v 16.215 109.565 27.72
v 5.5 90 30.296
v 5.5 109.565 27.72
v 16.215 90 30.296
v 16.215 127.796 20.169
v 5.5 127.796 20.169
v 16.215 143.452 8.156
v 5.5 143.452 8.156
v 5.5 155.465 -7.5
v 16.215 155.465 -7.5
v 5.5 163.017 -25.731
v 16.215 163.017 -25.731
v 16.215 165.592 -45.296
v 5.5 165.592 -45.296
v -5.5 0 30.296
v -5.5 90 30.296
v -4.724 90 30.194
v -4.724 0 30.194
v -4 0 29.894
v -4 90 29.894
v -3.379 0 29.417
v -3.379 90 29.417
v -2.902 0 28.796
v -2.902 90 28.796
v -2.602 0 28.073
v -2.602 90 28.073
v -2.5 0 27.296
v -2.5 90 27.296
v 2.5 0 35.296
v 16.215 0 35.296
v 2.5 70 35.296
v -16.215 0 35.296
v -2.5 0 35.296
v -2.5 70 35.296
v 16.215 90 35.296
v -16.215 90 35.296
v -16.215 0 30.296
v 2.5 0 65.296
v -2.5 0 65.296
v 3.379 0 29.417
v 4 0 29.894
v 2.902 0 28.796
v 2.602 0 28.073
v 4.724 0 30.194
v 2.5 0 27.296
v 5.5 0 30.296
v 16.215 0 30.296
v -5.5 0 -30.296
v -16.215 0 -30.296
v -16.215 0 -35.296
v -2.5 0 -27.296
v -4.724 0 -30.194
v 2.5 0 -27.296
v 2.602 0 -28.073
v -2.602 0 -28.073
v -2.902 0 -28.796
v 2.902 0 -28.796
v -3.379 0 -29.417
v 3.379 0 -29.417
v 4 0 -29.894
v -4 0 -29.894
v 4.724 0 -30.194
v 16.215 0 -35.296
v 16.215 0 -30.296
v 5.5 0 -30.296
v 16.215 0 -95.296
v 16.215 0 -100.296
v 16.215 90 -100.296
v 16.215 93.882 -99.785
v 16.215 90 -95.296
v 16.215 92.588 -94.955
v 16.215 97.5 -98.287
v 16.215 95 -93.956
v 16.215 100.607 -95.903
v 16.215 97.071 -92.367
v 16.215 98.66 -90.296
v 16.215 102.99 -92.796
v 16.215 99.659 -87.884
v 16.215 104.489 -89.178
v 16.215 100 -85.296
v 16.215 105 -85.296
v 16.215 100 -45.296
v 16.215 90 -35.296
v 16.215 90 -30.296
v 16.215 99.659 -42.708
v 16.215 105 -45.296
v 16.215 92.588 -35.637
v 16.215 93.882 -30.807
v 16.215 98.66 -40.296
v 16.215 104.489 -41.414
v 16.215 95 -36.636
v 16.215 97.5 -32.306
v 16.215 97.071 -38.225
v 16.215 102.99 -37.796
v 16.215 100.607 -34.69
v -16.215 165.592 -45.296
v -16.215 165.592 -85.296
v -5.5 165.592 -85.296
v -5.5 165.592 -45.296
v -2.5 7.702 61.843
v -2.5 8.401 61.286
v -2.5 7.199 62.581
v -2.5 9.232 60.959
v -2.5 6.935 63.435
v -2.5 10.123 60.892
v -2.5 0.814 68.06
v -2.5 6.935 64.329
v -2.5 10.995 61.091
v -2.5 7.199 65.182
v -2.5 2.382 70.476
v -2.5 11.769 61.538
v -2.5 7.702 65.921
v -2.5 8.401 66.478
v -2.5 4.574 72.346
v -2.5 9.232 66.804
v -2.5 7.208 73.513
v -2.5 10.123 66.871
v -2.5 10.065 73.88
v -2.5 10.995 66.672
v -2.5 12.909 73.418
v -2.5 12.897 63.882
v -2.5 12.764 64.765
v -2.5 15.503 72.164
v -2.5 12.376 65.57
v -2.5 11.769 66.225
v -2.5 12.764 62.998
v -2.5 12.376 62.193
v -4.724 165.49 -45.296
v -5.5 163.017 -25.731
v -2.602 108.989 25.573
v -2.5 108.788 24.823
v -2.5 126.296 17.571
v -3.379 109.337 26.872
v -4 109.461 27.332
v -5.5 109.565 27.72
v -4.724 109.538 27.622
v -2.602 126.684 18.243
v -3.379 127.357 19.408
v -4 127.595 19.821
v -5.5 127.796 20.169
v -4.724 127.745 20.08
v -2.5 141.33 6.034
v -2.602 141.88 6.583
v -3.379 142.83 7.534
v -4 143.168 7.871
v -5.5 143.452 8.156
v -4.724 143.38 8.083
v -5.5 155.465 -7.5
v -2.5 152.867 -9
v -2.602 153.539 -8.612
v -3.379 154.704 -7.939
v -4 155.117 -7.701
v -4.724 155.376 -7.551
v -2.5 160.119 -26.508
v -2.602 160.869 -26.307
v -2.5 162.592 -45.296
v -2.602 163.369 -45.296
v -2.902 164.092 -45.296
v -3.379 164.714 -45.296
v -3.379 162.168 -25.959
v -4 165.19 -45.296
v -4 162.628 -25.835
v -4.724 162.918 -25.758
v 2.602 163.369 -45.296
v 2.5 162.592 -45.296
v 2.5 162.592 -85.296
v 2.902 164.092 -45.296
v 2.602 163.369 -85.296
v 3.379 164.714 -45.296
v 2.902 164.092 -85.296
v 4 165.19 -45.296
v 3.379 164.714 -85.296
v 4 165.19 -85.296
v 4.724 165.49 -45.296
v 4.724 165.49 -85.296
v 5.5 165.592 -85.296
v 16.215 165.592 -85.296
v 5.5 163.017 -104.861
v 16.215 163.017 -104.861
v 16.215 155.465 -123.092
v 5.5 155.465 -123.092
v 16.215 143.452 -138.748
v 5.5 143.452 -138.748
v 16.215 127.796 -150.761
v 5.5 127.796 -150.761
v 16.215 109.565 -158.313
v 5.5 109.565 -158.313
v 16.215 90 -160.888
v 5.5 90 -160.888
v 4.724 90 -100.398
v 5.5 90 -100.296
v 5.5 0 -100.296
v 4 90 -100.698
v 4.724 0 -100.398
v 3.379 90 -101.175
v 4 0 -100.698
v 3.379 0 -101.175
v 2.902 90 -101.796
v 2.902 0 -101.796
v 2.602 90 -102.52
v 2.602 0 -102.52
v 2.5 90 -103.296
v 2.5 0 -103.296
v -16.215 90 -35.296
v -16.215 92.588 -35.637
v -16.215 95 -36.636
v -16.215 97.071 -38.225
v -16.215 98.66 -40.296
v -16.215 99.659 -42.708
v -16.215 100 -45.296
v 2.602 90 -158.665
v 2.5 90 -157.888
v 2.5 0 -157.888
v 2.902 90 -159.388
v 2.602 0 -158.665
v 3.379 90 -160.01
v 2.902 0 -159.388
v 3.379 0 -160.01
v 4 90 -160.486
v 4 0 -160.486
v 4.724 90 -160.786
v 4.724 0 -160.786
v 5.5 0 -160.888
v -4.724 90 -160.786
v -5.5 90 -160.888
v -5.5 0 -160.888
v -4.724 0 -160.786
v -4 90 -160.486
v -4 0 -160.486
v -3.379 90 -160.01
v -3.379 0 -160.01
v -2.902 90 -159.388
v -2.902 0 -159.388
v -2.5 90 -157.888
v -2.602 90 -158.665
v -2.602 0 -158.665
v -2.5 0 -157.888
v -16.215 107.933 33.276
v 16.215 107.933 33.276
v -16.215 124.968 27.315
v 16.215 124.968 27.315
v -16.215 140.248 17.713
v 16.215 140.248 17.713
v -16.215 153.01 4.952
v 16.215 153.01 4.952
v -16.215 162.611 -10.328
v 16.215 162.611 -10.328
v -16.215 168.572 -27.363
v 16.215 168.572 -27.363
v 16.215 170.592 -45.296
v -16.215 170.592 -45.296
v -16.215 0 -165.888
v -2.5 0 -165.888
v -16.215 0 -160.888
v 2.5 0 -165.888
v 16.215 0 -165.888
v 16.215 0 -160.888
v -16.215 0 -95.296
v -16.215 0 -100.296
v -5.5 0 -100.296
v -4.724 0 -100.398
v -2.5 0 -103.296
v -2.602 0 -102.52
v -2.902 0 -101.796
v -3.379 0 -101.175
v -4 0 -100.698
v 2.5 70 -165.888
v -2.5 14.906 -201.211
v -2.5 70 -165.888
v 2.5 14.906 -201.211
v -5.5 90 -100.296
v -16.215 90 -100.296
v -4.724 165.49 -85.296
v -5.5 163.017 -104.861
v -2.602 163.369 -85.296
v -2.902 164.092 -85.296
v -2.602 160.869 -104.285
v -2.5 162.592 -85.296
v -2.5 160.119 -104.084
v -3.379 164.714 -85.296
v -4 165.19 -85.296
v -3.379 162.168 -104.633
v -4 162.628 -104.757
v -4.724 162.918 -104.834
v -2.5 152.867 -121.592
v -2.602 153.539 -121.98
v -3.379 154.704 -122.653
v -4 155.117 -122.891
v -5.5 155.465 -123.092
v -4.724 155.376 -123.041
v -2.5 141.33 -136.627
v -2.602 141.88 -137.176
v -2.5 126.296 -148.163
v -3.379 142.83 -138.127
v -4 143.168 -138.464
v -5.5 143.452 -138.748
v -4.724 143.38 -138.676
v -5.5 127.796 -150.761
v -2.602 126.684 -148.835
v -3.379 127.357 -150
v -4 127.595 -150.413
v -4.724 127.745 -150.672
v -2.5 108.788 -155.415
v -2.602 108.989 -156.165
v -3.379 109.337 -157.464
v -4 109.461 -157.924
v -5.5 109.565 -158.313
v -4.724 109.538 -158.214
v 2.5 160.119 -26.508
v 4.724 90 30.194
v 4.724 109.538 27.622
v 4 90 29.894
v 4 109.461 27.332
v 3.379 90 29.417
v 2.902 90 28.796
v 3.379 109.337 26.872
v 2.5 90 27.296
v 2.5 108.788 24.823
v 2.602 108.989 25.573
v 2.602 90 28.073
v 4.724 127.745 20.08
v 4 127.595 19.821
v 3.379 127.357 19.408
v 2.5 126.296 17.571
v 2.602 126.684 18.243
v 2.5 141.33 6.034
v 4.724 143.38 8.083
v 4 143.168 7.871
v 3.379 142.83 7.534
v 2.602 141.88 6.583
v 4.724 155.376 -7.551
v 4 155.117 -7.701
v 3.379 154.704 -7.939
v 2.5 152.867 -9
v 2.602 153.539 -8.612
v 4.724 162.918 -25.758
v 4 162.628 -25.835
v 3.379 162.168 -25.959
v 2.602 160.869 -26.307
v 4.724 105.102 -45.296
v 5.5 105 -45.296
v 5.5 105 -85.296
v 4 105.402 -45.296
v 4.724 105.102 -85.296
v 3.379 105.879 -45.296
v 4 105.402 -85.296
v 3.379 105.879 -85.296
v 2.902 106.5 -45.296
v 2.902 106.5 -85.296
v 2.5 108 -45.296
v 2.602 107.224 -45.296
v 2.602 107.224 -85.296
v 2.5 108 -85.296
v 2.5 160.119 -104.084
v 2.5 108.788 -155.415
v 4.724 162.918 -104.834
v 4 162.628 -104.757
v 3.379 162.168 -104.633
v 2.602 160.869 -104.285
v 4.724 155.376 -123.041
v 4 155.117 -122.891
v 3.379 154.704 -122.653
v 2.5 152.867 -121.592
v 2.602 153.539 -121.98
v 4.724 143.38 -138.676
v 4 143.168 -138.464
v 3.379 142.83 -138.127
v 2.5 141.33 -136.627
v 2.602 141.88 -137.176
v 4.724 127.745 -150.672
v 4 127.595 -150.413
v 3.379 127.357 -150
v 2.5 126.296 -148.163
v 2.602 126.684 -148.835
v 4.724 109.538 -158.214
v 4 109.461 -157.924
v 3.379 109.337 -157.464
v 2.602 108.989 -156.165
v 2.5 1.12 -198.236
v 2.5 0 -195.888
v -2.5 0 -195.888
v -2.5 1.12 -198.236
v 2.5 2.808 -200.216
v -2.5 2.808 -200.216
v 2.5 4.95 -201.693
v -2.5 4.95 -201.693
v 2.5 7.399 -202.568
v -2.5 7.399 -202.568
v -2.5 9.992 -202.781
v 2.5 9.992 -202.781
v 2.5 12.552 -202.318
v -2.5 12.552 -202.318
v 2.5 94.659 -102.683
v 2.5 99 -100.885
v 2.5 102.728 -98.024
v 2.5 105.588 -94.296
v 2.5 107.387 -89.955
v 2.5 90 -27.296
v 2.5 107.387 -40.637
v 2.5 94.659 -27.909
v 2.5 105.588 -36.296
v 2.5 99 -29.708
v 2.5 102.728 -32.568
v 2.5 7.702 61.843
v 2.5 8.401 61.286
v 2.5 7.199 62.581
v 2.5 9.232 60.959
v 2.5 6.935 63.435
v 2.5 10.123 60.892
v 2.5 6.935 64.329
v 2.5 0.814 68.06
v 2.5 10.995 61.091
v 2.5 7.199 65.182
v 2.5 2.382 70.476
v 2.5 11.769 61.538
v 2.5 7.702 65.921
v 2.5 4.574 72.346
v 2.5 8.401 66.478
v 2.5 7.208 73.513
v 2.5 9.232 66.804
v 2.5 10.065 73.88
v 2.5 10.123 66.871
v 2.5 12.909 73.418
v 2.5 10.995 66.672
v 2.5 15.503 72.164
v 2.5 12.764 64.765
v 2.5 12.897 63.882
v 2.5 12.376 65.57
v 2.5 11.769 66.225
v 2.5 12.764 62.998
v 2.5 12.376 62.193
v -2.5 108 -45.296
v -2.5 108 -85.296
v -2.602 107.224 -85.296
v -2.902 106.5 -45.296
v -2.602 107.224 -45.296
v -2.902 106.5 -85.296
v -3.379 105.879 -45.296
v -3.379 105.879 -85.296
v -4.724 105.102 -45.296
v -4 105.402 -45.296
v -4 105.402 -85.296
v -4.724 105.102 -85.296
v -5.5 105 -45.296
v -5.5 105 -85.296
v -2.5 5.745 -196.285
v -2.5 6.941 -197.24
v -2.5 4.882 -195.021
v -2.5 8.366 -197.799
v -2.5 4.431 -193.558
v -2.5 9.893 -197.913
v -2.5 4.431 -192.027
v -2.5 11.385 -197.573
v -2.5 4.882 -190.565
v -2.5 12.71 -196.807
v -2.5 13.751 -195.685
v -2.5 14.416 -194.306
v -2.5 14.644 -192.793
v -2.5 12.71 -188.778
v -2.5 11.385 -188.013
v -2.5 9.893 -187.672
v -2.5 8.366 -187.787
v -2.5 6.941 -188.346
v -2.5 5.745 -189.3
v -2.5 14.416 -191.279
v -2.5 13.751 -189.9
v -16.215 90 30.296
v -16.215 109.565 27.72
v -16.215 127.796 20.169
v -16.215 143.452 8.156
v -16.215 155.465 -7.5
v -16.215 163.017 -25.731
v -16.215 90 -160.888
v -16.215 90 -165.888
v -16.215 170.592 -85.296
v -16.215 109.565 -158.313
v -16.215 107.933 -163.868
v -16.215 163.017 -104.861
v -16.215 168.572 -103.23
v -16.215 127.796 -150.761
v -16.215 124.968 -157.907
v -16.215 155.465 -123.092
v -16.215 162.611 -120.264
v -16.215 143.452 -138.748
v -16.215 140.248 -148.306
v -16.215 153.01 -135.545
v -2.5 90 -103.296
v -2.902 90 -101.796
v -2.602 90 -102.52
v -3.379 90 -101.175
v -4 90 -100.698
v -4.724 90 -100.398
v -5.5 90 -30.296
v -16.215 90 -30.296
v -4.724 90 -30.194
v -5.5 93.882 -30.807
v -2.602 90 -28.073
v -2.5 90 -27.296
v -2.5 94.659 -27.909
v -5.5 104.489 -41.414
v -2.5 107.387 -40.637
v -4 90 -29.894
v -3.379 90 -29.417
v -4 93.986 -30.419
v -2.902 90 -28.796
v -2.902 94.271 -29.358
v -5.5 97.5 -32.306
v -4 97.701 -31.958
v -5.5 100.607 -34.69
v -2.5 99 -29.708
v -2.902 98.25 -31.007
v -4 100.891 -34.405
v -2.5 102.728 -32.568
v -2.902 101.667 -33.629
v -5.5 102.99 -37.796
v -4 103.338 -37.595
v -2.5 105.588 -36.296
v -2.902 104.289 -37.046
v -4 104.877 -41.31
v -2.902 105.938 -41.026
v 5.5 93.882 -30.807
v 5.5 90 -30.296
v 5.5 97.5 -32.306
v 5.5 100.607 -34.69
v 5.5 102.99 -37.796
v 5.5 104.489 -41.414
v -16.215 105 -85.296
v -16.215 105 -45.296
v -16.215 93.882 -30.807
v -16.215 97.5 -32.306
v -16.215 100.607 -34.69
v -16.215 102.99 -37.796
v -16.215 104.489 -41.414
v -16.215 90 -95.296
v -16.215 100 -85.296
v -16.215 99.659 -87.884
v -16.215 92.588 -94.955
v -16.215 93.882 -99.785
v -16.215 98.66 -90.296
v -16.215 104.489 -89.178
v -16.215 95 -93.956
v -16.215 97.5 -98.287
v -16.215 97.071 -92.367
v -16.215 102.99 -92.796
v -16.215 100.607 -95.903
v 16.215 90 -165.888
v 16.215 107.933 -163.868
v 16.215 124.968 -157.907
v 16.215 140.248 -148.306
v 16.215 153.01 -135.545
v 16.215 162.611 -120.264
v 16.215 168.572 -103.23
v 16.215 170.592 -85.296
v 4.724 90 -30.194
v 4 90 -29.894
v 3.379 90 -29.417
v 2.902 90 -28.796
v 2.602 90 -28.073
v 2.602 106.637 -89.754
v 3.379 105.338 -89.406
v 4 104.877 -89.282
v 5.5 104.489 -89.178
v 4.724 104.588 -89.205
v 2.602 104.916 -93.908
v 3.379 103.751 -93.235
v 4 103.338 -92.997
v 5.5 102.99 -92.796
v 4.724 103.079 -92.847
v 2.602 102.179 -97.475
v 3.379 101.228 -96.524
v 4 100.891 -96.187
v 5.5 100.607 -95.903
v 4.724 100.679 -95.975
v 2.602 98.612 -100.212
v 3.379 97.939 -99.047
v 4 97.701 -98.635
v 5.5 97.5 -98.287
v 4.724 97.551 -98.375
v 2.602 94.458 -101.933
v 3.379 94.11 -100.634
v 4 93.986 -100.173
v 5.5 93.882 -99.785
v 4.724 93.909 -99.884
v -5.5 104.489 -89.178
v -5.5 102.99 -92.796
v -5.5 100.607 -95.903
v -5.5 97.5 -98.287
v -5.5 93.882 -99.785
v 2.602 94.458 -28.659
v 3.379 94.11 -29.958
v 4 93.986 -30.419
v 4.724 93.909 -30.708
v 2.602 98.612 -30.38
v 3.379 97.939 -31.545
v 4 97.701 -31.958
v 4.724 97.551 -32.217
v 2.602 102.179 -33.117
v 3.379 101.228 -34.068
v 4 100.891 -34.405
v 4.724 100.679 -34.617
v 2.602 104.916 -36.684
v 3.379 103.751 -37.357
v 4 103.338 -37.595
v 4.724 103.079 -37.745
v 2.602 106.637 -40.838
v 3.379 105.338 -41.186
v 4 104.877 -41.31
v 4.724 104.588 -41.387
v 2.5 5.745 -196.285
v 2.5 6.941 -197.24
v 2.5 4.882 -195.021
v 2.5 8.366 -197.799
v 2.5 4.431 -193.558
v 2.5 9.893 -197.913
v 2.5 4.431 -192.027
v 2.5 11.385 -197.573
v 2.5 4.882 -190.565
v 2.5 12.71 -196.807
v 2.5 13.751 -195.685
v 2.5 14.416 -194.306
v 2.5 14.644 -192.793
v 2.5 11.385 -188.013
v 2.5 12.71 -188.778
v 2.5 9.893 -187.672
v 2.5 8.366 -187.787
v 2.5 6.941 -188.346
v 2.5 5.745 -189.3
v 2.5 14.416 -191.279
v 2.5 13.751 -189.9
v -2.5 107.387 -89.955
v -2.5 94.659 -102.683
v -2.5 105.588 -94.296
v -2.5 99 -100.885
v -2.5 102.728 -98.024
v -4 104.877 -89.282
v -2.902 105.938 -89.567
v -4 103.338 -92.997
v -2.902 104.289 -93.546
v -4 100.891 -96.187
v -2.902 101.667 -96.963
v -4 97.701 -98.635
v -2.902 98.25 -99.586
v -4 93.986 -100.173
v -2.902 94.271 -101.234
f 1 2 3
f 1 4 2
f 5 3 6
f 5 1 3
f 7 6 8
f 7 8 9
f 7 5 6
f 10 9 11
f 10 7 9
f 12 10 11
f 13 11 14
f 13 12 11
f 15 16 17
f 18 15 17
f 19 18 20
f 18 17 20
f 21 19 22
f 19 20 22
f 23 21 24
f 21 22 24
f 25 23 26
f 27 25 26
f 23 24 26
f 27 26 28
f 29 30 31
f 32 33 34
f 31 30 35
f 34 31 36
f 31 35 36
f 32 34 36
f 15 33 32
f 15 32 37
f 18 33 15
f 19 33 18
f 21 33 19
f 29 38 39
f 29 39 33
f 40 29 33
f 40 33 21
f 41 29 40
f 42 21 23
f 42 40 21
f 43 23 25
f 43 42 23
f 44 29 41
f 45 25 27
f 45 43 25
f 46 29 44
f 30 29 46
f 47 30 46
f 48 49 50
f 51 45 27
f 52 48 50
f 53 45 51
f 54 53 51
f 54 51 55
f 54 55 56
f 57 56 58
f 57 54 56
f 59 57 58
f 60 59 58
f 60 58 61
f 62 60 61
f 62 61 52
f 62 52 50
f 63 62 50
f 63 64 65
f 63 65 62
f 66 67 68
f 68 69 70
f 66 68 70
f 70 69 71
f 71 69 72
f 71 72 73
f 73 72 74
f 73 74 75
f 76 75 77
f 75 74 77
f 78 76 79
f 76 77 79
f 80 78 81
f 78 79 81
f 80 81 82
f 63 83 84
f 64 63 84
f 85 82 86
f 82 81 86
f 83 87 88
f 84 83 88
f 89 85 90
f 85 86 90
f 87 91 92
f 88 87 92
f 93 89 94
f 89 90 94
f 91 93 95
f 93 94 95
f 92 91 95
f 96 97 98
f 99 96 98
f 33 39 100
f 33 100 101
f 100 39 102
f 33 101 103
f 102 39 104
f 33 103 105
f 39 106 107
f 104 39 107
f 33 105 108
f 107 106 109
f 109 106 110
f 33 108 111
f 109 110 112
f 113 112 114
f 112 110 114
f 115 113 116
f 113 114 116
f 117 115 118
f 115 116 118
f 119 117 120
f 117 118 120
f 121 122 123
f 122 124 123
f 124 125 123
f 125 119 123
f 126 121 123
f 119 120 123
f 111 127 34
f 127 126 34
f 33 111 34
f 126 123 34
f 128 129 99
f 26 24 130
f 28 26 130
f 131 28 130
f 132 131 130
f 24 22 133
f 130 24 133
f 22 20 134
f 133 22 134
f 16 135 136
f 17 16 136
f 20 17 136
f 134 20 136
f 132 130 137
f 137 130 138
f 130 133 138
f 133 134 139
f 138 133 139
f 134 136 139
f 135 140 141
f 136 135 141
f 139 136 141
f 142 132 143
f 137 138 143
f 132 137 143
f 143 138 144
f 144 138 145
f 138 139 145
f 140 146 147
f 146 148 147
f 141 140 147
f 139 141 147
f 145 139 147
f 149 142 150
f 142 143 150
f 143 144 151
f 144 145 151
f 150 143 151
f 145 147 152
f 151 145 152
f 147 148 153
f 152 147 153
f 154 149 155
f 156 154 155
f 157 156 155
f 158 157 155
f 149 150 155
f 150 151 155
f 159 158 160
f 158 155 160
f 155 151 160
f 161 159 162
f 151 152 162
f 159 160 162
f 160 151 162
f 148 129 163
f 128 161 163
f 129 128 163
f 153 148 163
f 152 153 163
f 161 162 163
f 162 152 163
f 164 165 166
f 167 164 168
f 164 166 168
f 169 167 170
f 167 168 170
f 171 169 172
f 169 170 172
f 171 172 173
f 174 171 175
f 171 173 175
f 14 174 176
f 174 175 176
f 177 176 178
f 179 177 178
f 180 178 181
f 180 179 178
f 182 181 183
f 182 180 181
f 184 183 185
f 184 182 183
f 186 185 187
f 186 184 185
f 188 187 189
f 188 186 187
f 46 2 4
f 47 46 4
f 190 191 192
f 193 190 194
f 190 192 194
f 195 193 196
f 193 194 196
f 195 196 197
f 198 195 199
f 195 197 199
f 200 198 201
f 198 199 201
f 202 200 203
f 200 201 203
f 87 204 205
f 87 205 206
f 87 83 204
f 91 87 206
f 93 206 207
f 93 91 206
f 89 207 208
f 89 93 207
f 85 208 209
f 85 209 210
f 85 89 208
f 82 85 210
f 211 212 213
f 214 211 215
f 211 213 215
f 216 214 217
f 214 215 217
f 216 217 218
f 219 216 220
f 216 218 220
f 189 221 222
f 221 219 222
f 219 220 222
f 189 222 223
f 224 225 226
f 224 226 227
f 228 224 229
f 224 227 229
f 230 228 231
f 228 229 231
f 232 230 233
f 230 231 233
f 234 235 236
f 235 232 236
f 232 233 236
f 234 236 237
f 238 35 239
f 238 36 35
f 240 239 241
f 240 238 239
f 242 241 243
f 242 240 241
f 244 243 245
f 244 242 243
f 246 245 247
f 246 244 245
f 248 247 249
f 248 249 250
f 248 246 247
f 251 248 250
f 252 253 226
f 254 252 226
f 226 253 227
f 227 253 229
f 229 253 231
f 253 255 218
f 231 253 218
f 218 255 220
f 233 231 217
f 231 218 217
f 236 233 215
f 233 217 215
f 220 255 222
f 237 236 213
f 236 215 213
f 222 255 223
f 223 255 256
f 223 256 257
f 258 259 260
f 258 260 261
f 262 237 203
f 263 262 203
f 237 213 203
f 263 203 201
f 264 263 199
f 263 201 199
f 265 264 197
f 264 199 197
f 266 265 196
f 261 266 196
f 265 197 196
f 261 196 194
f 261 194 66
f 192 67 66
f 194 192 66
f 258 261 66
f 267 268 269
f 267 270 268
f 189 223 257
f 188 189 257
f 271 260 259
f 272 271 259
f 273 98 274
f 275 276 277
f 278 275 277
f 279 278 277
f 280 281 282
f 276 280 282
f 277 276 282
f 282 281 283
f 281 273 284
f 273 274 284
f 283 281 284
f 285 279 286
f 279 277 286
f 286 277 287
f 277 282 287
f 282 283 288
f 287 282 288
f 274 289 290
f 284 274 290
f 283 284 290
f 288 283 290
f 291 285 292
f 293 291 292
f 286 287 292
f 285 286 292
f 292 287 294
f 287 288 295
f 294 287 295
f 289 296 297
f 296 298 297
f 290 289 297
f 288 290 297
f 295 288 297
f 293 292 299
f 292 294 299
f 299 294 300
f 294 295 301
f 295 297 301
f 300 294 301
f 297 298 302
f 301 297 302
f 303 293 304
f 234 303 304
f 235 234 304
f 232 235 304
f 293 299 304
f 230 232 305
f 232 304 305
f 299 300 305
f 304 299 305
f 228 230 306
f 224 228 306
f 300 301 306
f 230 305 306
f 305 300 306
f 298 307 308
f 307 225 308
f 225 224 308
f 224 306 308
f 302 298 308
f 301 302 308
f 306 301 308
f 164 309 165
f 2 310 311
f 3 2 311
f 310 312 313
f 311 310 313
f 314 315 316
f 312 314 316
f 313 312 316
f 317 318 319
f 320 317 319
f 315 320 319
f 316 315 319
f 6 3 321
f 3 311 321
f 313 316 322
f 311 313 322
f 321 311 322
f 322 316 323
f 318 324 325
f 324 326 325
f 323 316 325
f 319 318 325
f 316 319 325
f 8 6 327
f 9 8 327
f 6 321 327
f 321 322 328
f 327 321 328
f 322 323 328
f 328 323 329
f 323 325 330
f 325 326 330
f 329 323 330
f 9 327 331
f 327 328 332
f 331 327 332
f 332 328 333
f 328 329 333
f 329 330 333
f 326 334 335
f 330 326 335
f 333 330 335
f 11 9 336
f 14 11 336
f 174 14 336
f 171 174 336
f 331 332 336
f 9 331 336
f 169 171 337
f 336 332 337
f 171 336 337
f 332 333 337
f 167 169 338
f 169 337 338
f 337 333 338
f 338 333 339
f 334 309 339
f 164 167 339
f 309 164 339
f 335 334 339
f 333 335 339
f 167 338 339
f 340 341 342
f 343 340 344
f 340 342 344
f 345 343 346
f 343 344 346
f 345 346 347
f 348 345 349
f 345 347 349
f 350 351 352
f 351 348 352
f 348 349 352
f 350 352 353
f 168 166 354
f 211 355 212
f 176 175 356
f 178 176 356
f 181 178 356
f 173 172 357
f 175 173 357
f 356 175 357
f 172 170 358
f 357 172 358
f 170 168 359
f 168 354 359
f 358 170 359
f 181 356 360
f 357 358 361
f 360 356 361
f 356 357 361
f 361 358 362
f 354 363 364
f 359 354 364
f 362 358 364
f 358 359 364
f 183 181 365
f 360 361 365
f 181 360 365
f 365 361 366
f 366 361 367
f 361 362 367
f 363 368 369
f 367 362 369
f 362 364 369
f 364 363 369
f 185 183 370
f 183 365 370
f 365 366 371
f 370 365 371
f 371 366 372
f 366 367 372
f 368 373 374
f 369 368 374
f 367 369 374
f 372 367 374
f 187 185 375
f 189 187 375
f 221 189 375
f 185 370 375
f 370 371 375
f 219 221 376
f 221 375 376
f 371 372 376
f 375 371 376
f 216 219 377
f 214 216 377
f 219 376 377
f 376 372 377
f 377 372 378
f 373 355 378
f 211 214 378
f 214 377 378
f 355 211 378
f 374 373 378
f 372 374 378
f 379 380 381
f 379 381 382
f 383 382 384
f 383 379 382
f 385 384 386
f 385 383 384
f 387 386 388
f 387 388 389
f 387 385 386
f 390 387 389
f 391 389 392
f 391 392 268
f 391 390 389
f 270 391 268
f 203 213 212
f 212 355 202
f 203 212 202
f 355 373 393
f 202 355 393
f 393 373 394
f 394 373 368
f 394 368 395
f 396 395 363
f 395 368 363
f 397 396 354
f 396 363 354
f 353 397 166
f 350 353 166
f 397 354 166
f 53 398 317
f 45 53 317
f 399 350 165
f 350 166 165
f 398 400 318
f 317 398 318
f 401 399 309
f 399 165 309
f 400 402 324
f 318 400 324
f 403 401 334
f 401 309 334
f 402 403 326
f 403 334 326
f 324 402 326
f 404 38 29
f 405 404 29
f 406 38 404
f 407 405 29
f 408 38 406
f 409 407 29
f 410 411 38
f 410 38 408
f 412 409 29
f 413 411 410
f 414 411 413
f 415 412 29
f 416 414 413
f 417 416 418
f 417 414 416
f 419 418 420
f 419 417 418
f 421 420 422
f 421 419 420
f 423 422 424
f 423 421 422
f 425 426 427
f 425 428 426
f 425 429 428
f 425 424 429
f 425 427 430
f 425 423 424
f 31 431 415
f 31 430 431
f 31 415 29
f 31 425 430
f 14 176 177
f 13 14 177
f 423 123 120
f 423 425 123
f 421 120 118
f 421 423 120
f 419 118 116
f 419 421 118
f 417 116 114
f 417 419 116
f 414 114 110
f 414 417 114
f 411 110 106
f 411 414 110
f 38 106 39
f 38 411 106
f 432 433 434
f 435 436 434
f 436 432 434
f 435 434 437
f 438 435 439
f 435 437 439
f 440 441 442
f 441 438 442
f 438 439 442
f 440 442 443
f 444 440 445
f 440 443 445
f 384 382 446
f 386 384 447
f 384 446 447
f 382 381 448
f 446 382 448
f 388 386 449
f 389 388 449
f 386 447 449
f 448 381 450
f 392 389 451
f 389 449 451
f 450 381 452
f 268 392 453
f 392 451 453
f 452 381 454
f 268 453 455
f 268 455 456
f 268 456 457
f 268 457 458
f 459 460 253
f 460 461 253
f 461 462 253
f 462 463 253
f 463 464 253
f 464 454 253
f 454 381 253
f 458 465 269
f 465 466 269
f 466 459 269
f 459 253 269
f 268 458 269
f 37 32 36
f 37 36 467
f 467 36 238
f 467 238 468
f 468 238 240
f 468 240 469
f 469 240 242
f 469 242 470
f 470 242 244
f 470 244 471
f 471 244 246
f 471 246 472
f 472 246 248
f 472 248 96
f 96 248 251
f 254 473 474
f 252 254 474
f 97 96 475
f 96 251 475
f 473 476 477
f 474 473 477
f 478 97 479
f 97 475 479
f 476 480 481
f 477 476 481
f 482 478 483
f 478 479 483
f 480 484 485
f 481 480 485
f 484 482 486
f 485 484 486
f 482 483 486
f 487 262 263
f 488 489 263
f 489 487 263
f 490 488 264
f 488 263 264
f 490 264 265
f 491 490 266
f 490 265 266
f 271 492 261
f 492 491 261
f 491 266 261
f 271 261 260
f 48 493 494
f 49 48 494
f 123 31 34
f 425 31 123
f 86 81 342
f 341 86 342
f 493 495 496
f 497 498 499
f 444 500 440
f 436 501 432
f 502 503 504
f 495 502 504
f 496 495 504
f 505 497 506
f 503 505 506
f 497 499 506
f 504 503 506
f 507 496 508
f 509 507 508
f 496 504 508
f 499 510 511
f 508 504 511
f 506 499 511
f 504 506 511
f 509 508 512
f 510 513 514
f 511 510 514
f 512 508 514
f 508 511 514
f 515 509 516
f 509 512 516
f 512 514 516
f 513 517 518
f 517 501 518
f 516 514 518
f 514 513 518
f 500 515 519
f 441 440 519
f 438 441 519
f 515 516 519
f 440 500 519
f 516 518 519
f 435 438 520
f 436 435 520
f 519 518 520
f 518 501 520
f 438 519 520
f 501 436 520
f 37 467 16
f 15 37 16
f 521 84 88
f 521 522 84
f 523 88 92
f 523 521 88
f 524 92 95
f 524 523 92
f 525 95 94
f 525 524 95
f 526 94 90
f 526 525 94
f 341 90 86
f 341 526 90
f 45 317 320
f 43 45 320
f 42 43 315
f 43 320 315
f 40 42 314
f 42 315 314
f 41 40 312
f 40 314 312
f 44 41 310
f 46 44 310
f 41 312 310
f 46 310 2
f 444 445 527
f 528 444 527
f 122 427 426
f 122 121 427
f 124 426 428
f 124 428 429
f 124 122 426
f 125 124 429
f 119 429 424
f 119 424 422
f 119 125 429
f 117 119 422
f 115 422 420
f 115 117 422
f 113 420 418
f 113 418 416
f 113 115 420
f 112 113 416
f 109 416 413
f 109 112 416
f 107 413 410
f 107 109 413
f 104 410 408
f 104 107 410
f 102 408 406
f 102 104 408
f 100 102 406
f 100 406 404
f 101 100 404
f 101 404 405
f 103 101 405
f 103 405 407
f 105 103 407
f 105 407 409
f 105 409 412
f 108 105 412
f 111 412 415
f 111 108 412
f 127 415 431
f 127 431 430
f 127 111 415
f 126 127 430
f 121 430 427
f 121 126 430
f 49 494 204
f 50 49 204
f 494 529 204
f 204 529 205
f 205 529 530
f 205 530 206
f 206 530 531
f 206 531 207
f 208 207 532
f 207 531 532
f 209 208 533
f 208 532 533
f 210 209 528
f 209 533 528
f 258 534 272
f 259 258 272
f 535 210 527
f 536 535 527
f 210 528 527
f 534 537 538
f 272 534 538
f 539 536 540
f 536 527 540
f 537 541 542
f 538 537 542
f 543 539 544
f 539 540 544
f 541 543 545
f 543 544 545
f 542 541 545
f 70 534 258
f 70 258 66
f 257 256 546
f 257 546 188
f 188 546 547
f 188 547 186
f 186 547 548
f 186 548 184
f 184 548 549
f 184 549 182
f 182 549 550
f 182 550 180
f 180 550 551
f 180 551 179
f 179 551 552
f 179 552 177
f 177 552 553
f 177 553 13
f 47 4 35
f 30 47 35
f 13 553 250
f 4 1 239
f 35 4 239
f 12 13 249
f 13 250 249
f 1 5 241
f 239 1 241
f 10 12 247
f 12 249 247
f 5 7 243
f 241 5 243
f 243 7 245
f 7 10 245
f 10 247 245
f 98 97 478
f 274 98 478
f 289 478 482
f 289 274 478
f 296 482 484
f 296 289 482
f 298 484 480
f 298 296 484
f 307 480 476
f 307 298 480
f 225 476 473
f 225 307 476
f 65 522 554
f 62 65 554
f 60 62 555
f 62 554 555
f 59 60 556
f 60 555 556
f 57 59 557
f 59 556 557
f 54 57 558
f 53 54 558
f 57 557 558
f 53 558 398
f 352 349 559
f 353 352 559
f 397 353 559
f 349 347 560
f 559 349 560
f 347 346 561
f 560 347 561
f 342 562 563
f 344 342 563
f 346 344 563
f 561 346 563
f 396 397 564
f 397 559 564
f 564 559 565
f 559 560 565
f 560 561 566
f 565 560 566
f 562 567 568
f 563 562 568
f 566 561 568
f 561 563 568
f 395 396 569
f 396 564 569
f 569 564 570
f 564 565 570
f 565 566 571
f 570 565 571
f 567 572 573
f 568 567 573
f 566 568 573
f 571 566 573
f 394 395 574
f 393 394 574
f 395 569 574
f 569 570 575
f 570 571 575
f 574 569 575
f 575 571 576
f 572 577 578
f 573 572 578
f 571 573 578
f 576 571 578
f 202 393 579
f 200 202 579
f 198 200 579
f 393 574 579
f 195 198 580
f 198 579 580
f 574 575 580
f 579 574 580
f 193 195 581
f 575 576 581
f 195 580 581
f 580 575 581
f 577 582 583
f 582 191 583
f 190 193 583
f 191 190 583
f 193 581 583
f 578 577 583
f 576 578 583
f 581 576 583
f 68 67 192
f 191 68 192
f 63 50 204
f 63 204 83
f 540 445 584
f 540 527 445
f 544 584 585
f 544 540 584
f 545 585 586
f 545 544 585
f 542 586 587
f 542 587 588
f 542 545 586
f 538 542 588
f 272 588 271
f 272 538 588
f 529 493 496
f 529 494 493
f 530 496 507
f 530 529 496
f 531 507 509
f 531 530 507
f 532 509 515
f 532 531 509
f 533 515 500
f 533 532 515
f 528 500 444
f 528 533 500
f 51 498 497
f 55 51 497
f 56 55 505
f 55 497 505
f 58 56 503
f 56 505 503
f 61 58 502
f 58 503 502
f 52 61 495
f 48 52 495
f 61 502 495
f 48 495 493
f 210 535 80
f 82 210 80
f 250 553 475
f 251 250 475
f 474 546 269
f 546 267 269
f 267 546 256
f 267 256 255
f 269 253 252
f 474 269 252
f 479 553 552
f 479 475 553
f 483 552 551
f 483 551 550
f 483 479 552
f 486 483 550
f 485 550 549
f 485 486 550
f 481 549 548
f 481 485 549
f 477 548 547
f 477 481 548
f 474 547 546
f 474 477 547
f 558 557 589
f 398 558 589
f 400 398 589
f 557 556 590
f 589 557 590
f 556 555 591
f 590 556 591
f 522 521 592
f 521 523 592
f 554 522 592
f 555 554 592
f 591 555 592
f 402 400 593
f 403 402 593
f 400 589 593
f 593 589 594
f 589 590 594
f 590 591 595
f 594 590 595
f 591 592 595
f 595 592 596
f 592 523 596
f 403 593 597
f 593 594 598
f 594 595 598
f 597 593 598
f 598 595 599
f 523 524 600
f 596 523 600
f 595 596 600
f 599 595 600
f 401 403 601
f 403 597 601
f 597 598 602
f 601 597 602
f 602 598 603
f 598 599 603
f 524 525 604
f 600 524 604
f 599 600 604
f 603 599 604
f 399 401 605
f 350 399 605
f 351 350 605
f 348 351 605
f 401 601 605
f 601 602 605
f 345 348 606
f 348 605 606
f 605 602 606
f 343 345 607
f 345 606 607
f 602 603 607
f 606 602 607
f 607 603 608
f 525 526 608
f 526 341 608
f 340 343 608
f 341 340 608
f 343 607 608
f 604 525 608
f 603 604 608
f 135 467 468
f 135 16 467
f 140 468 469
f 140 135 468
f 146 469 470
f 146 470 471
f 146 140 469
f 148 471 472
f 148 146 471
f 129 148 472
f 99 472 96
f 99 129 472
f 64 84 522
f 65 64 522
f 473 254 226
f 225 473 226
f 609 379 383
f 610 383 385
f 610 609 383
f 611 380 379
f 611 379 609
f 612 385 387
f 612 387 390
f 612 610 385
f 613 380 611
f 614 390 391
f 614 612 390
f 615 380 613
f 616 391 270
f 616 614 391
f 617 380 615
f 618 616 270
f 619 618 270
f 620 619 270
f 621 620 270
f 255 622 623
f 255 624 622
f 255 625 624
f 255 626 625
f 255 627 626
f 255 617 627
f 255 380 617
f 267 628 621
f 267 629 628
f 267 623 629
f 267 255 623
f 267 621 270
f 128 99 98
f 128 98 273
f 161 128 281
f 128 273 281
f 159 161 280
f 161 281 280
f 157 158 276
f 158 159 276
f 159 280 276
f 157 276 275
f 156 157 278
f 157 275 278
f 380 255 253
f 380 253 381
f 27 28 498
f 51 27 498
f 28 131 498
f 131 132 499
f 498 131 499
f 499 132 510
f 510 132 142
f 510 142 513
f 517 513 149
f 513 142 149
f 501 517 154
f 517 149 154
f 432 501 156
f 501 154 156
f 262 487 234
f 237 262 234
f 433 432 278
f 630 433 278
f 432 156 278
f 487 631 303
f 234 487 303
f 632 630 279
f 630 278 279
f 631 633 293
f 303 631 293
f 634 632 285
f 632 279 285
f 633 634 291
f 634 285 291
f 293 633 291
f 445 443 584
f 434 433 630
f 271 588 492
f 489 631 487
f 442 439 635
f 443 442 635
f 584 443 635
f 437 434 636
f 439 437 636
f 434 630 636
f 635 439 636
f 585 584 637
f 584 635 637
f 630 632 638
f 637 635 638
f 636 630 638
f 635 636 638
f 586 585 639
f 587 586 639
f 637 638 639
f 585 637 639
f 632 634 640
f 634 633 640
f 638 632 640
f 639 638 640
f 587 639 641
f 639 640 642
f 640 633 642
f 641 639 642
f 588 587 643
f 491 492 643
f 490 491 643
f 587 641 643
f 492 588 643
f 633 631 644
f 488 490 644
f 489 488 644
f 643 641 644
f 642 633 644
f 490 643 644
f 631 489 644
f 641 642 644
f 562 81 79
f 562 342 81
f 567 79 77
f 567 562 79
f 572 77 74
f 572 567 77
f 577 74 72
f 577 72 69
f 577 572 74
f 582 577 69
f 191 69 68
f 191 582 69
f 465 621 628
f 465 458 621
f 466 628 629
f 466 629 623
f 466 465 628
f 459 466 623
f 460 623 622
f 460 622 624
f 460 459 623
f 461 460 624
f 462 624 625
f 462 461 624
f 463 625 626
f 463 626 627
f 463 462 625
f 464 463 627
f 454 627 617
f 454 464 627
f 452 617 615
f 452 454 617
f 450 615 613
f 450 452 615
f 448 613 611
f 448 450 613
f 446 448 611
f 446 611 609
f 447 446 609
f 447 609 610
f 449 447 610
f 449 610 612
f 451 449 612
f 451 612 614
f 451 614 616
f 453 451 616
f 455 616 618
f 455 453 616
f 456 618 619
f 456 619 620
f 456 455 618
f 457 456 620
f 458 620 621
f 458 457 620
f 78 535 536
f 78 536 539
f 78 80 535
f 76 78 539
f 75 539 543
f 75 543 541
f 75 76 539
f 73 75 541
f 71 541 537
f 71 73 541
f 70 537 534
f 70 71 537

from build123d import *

# Parameters (mm, degrees)
F3_R     = 2.9977693339
F4_DEPTH = 2.5
F5_R     = 5.1348432566
F6_DEPTH = 2.5


with BuildPart() as f2:
    # F2: sweep along a path in F1
    with BuildLine(Plane.YZ) as f2_path:
        Line((0, -35.2961234748), (90, -35.2961234748))
        ThreePointArc((90, -35.2961234748), (97.0710678119, -38.225055663), (100, -45.2961234748))
        Line((100, -45.2961234748), (100, -85.2961234748))
        ThreePointArc((100, -85.2961234748), (97.0710678119, -92.3671912867), (90, -95.2961234748))
        Line((90, -95.2961234748), (0, -95.2961234748))
    # F0 (on Front) → F2 (sweep)
    with BuildSketch(Plane.XZ):
        with BuildLine():
            Line((16.2149220705, 35.2961234748), (0, 35.2961234748))
            Line((0, 35.2961234748), (-16.2149220705, 35.2961234748))
            Line((-16.2149220705, 35.2961234748), (-16.2149220705, 30.2961234748))
            Line((-16.2149220705, 30.2961234748), (-5.5, 30.2961234748))
            ThreePointArc((-5.5, 30.2961234748), (-3.3786796564, 29.4174438184), (-2.5, 27.2961234748))
            Line((-2.5, 27.2961234748), (-2.5, 0))
            Line((-2.5, 0), (-2.5, -27.2961234748))
            ThreePointArc((-2.5, -27.2961234748), (-3.3786796564, -29.4174438184), (-5.5, -30.2961234748))
            Line((-5.5, -30.2961234748), (-16.2149220705, -30.2961234748))
            Line((-16.2149220705, -30.2961234748), (-16.2149220705, -35.2961234748))
            Line((-16.2149220705, -35.2961234748), (0, -35.2961234748))
            Line((0, -35.2961234748), (16.2149220705, -35.2961234748))
            Line((16.2149220705, -35.2961234748), (16.2149220705, -30.2961234748))
            Line((16.2149220705, -30.2961234748), (5.5, -30.2961234748))
            ThreePointArc((5.5, -30.2961234748), (3.3786796564, -29.4174438184), (2.5, -27.2961234748))
            Line((2.5, -27.2961234748), (2.5, 0))
            Line((2.5, 0), (2.5, 27.2961234748))
            ThreePointArc((2.5, 27.2961234748), (3.3786796564, 29.4174438184), (5.5, 30.2961234748))
            Line((5.5, 30.2961234748), (16.2149220705, 30.2961234748))
            Line((16.2149220705, 30.2961234748), (16.2149220705, 35.2961234748))
        make_face()
    sweep(path=f2_path.line)

    # F3 (on Right) → F4 (join, symmetric)
    with BuildSketch(Plane.YZ):
        with BuildLine():
            Line((0, 65.2961234748), (0, 35.2961234748))
            Line((0, 35.2961234748), (70, 35.2961234748))
            Line((70, 35.2961234748), (15.5028312053, 72.1644029996))
            ThreePointArc((15.5028312053, 72.1644029996), (5.8488593767, 73.0246440824), (0, 65.2961234748))
        make_face()
        with Locations((9.8994718868, 63.8817485732)):
            Circle(F3_R, mode=Mode.SUBTRACT)
    extrude(amount=F4_DEPTH, both=True)

    # F5 (on Right) → F6 (join, symmetric)
    with BuildSketch(Plane.YZ):
        with BuildLine():
            Line((70, -165.8883704245), (0, -165.8883704245))
            Line((0, -165.8883704245), (0, -195.8883704245))
            ThreePointArc((0, -195.8883704245), (6.1459122057, -202.2103795466), (14.9061395374, -201.2111532078))
            Line((14.9061395374, -201.2111532078), (70, -165.8883704245))
        make_face()
        with Locations((9.508806352, -192.7927926497)):
            Circle(F5_R, mode=Mode.SUBTRACT)
    extrude(amount=F6_DEPTH, both=True)


solid = f2.part
